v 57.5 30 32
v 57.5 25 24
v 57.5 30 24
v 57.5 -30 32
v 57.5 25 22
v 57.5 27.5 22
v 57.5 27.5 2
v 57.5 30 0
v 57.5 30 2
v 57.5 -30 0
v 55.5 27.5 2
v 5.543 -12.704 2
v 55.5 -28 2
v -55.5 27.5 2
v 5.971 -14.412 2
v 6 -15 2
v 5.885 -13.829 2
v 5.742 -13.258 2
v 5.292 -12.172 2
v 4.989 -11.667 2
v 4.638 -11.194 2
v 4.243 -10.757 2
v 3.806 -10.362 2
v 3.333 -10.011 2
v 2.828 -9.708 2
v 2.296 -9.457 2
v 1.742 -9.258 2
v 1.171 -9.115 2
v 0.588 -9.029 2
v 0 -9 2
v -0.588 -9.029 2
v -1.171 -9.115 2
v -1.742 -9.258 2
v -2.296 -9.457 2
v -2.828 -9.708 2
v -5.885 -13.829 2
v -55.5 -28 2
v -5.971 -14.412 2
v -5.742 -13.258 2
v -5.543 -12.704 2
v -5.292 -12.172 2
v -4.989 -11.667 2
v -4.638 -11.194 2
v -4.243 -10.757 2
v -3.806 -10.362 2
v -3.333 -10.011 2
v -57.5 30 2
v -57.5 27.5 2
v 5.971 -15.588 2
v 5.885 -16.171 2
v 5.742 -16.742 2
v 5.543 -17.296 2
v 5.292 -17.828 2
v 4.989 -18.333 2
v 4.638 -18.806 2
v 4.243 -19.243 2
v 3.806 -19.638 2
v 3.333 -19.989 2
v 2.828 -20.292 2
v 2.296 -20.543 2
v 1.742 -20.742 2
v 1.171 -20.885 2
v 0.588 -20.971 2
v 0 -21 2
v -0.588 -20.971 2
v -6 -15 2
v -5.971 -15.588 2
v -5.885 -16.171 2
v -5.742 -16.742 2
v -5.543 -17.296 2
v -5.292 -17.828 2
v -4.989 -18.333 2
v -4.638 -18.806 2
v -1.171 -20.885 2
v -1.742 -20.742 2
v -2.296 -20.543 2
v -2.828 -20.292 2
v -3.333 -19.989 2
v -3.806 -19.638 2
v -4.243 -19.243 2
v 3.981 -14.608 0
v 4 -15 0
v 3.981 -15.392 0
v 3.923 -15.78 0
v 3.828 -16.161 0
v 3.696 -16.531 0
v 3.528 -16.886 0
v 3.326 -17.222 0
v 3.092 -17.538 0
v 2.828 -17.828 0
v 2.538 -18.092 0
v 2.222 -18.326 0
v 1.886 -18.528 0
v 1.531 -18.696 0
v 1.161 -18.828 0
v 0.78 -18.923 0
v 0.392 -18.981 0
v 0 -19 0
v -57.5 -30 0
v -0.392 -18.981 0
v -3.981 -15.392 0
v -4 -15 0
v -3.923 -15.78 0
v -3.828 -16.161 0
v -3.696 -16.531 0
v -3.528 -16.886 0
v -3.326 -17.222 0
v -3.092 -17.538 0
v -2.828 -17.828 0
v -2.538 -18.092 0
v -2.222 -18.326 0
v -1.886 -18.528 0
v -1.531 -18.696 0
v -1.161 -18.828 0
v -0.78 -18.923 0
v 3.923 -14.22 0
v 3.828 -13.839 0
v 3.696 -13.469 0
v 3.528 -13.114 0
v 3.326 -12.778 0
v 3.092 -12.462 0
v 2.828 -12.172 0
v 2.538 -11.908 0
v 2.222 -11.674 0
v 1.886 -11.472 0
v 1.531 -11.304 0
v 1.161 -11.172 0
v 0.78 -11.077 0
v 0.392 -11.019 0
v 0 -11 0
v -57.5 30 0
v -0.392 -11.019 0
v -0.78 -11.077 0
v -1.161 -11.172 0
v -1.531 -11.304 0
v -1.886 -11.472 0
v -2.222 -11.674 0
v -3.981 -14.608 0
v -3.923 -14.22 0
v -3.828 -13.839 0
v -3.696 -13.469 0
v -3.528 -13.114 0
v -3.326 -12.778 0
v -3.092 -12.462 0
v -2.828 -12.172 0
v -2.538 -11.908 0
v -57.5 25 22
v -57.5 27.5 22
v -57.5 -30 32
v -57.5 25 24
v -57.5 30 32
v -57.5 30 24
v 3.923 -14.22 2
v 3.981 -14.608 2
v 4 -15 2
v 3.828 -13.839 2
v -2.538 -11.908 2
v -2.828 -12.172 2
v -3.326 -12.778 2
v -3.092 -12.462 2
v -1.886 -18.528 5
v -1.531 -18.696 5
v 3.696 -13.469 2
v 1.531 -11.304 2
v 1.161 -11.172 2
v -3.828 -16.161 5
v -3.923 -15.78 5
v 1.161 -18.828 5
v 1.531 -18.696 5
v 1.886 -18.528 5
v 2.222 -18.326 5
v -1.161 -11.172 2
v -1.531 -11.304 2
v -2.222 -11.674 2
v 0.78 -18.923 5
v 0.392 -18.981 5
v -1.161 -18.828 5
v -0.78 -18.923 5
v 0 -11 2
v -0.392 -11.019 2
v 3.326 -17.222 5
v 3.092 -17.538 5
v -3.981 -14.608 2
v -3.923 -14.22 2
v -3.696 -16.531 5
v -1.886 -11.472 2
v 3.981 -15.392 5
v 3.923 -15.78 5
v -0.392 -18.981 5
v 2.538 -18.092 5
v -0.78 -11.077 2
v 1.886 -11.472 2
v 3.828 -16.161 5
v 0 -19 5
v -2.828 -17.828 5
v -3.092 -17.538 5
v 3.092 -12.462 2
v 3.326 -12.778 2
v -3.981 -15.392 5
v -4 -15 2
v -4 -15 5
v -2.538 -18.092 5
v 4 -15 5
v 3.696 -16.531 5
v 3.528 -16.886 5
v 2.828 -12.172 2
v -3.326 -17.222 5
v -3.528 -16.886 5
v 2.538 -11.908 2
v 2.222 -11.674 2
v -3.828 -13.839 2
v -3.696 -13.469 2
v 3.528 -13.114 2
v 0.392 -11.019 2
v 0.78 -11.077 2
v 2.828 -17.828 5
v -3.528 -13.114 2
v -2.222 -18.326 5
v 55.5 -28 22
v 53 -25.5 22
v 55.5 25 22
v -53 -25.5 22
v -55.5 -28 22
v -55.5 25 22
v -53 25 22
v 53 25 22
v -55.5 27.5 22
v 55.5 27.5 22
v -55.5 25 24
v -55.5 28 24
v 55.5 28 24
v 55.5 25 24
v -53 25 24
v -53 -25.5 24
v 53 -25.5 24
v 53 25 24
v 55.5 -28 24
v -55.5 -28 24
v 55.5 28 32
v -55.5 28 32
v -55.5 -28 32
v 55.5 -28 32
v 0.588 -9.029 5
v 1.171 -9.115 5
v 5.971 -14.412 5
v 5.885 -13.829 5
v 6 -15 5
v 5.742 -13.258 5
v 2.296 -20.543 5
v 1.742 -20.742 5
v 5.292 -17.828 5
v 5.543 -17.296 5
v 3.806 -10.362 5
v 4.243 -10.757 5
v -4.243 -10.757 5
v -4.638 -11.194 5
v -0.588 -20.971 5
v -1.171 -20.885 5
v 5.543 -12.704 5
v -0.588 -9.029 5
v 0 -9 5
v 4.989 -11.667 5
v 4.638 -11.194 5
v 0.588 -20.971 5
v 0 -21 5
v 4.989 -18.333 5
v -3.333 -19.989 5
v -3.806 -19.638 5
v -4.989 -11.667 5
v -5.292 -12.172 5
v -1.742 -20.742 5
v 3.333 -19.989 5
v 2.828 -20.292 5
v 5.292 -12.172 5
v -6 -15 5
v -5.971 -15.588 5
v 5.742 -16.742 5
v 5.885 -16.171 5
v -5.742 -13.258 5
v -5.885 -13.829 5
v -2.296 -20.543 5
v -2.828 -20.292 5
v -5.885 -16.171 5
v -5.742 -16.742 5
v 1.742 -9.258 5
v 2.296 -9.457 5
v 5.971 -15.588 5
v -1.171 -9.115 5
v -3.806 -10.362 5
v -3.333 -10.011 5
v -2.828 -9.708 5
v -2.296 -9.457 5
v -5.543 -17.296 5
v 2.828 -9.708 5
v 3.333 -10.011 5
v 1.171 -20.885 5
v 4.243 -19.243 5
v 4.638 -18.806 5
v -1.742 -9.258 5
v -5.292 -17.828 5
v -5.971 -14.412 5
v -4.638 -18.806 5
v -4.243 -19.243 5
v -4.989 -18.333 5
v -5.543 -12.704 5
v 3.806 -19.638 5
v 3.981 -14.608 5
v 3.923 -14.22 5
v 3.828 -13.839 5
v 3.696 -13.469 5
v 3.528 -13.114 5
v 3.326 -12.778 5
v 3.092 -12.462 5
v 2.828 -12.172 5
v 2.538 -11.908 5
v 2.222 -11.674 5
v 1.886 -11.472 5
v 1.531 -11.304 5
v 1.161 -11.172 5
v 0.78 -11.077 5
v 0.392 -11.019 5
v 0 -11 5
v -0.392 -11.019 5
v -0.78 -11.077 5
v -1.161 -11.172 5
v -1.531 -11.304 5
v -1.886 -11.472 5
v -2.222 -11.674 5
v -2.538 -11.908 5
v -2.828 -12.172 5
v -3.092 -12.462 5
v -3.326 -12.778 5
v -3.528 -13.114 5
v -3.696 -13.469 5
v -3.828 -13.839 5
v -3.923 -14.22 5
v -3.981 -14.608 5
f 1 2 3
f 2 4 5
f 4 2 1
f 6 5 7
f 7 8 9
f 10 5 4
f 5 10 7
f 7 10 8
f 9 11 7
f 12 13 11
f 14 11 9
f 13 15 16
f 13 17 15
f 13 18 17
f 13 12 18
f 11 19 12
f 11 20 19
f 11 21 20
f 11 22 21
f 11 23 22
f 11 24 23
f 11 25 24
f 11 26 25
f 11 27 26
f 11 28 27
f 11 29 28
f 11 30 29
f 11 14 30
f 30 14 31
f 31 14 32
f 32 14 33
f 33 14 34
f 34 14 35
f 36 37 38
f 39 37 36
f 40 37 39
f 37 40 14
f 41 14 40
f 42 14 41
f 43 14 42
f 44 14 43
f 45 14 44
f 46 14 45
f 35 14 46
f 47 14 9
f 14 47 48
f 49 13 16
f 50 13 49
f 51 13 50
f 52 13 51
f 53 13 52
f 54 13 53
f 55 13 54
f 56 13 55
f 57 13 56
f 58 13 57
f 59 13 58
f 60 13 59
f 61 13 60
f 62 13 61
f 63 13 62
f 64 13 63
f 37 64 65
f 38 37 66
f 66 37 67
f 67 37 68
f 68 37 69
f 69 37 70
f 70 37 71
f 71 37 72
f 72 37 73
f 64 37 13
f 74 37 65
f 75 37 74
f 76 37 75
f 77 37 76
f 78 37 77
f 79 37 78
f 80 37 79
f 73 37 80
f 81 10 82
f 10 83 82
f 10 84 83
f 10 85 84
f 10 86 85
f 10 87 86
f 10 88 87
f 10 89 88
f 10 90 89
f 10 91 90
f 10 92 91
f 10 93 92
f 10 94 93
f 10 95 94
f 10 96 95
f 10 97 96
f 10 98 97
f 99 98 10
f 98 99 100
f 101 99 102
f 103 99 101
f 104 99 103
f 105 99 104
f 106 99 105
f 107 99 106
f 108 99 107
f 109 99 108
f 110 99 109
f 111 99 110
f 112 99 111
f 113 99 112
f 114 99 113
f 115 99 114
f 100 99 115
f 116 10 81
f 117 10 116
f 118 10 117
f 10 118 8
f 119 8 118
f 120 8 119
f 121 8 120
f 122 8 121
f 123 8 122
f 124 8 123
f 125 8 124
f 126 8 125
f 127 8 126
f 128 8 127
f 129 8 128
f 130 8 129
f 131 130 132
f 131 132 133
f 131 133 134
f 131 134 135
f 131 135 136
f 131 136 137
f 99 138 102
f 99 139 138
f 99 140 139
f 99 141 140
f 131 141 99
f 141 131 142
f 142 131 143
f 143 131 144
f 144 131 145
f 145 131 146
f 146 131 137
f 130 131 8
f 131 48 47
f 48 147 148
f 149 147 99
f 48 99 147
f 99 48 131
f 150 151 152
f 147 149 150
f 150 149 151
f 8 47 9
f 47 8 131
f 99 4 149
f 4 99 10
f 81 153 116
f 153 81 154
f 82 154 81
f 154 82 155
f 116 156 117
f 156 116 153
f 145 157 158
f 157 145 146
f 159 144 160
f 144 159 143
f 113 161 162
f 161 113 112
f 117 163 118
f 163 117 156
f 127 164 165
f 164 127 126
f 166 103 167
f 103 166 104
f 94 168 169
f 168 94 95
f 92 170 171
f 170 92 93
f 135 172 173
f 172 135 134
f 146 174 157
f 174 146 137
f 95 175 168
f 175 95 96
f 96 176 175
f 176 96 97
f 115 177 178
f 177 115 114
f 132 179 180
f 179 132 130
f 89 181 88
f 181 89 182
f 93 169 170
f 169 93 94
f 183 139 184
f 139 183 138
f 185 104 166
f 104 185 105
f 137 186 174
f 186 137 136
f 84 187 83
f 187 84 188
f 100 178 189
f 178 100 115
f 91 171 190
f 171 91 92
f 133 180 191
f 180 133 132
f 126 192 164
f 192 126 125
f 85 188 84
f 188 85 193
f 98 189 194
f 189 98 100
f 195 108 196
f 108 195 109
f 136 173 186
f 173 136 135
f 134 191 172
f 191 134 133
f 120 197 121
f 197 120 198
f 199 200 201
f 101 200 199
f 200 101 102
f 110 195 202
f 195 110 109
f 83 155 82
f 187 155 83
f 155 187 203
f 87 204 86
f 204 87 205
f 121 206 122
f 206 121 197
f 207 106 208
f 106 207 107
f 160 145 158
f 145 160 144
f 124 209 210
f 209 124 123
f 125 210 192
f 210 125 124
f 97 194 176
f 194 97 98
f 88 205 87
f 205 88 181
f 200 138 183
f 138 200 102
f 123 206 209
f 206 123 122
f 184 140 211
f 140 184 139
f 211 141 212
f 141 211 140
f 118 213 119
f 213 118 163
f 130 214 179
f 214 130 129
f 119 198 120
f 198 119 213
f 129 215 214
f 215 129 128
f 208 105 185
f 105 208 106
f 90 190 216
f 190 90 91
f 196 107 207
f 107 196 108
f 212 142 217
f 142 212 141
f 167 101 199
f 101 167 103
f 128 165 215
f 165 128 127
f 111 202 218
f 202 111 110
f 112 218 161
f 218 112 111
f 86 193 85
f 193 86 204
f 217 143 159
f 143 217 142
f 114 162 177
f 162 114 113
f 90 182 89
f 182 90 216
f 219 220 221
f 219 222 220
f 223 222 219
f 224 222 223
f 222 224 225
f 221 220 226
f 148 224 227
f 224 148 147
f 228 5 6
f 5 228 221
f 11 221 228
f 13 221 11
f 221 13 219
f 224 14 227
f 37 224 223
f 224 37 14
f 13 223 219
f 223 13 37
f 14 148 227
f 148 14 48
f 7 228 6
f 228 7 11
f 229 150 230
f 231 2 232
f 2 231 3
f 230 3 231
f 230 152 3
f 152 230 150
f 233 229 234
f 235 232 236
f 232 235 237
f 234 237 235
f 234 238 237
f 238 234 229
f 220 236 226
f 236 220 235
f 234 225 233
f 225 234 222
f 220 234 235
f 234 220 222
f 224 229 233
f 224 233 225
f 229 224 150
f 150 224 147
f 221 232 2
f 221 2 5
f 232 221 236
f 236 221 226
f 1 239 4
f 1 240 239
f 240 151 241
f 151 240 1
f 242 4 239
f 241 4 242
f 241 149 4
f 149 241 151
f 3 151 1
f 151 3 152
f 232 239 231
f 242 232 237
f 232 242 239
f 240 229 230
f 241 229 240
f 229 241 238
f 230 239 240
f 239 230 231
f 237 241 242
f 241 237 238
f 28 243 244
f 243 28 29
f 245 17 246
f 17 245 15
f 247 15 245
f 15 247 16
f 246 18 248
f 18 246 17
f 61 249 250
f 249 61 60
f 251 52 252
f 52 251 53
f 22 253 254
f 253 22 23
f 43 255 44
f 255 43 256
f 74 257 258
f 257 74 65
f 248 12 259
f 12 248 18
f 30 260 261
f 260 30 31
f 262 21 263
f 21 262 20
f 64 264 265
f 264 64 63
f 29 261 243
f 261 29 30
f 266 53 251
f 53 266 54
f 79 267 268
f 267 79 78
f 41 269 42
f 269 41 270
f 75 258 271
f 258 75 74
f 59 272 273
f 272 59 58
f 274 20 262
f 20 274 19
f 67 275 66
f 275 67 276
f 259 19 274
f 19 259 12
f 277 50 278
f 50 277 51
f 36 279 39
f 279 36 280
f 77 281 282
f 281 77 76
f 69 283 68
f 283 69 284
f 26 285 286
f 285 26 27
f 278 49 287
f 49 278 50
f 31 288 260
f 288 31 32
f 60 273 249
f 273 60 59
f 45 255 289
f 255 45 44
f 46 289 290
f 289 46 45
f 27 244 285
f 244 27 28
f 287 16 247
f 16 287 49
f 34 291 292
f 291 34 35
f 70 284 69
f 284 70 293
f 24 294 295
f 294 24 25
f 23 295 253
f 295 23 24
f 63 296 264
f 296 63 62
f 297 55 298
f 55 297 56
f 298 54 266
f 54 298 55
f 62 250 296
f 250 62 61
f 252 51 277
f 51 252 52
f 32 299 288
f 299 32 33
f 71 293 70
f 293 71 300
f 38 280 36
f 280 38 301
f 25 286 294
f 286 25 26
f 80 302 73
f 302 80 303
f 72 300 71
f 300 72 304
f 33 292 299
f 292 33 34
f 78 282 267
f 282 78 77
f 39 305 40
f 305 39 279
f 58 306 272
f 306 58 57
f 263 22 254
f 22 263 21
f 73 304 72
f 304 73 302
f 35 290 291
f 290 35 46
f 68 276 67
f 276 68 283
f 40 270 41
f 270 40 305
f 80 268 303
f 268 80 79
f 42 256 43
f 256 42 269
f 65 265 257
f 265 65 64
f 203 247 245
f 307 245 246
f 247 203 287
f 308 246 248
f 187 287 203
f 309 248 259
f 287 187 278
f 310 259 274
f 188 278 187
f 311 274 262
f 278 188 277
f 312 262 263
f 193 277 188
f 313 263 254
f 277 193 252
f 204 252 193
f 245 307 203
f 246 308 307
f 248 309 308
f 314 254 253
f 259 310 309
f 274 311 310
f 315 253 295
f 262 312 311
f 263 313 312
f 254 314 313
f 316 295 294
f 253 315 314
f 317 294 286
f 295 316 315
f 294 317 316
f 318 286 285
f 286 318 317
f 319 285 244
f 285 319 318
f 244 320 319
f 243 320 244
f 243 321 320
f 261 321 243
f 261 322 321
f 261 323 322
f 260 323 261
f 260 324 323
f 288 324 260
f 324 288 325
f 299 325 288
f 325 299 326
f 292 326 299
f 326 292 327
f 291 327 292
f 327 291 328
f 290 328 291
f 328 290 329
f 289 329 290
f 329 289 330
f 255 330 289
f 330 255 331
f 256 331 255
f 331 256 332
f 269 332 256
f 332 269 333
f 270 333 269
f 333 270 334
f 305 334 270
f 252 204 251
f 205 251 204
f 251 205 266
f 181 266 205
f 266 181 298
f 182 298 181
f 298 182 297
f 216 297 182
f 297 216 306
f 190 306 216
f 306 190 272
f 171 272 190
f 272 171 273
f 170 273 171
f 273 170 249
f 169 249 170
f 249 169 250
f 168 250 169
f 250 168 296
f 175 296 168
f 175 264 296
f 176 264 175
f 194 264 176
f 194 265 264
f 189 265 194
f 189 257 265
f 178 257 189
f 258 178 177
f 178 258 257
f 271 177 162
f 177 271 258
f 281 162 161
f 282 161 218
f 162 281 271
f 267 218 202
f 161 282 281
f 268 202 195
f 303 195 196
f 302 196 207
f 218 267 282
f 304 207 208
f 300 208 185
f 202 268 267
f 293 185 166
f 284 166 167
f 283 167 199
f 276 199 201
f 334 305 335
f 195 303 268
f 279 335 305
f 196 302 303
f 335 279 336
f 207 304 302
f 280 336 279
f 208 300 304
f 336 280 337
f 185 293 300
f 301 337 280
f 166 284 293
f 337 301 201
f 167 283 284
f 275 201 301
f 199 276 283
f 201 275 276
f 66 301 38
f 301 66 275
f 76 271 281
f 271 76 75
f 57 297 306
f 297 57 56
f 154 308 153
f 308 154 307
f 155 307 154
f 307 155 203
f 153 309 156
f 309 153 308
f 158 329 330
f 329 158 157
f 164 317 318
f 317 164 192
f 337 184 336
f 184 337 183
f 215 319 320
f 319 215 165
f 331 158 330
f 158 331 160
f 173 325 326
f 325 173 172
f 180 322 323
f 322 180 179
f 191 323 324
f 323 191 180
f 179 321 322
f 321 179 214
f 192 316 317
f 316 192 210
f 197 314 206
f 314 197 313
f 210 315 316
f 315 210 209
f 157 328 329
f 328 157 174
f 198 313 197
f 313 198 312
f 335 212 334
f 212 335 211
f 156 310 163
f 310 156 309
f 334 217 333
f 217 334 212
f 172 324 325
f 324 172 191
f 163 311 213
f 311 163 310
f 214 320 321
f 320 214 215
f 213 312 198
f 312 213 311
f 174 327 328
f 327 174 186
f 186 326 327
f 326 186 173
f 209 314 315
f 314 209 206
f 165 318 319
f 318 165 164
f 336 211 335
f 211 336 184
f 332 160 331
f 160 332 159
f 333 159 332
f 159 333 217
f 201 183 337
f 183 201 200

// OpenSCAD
// --- Parameters ---
pipe_width      = 110;   // outer width of the pipe (cap slips over)
pipe_depth      = 55;    // outer depth of the pipe
clearance       = 1.0;   // slip-fit clearance between collar and pipe
wall_thickness  = 2;
drain_diameter  = 8;     // drain hole sized for an 8 mm hose
hose_sleeve_h   = 3;     // short inner sleeve to keep the hose vertical
rim_height      = 20;    // visibility cavity height (also the +Y opening size, the "drip window")
stop_h          = 2;     // pipe-stop shelf thickness
stop_protrusion = 2;     // inward protrusion of the stop shelf
collar_height   = 8;     // compact slip-fit overlap with the pipe

$fn = 64;

// --- Derived: outer cap dimensions (collar fits over pipe outside) ---
inner_w = pipe_width + clearance;
inner_d = pipe_depth + clearance;
outer_w = inner_w + 2 * wall_thickness;
outer_d = inner_d + 2 * wall_thickness;

// Print orientation: model is upside-down so it prints support-free.
//   z = 0 (print bed)  -> outer top of the cap (real-use top, where the roof sits)
//   +z direction       -> "downward" in real use
//
// Layer cake from the bed up:
//   [0,                                       wall_thickness]                         roof (with drain hole)
//   [wall_thickness,                          wall_thickness + rim_height]            rim wall (drip cavity, +Y open)
//   [wall_thickness + rim_height,             ... + stop_h]                           stop shelf (catches pipe top)
//   [wall_thickness + rim_height + stop_h,    ... + collar_height]                    outer collar (pipe slip-fit)
// Total cap height = wall_thickness + rim_height + stop_h + collar_height = 32 mm.
// Drip view: +Y opening is rim_height + stop_h = 22 mm tall -> >= 20 mm visibility window.

union()
{
    // 1. Roof plate -- full flat lid with a single 8 mm drain hole offset to one half so the
    //    hose hangs at the back of the cavity (clear sightline through the +Y window).
    difference()
    {
        translate([ 0, 0, wall_thickness / 2 ])
            cube([ outer_w, outer_d, wall_thickness ], center = true);

        translate([ 0, -outer_d / 4, wall_thickness / 2 ])
            cylinder(h = wall_thickness + 1, d = drain_diameter, center = true);
    }

    // 2. Rim wall -- the drip-viewing cavity. Open on the +Y long side so the falling drops
    //    are visible from the side.
    translate([ 0, 0, wall_thickness ])
    difference()
    {
        translate([ 0, 0, rim_height / 2 ])
            cube([ outer_w, outer_d, rim_height ], center = true);

        translate([ 0, 0, rim_height / 2 ])
            cube([ outer_w - 2 * wall_thickness,
                   outer_d - 2 * wall_thickness,
                   rim_height + 1 ], center = true);

        // +Y opening (the visibility window)
        translate([ 0, outer_d / 2, rim_height / 2 ])
            cube([ outer_w + 2,
                   2 * wall_thickness + 1,
                   rim_height + 1 ], center = true);
    }

    // 3. Stop shelf -- inward ledge between rim and collar; cavity smaller than the pipe outer,
    //    so the pipe top abuts here and the cap can't slide deeper. +Y stays open for visibility.
    translate([ 0, 0, wall_thickness + rim_height ])
    difference()
    {
        translate([ 0, 0, stop_h / 2 ])
            cube([ outer_w, outer_d, stop_h ], center = true);

        translate([ 0, 0, stop_h / 2 ])
            cube([ pipe_width - 2 * stop_protrusion,
                   pipe_depth - 2 * stop_protrusion,
                   stop_h + 1 ], center = true);

        translate([ 0, outer_d / 2, stop_h / 2 ])
            cube([ outer_w + 2,
                   (outer_d - pipe_depth) + 2 * stop_protrusion + 1,
                   stop_h + 1 ], center = true);
    }

    // 4. Outer collar (slip-fits over the pipe outside)
    translate([ 0, 0, wall_thickness + rim_height + stop_h ])
    difference()
    {
        translate([ 0, 0, collar_height / 2 ])
            cube([ outer_w, outer_d, collar_height ], center = true);

        translate([ 0, 0, collar_height / 2 ])
            cube([ inner_w, inner_d, collar_height + 1 ], center = true);
    }

    // 5. Hose sleeve -- short tube around the drain hole, hanging into the cavity in real use
    //    so the 8 mm hose has something to seat into and stay vertical.
    translate([ 0, -outer_d / 4, wall_thickness ])
    difference()
    {
        cylinder(h = hose_sleeve_h, d = drain_diameter + 2 * wall_thickness);
        translate([ 0, 0, -0.5 ])
            cylinder(h = hose_sleeve_h + 1, d = drain_diameter);
    }
}
